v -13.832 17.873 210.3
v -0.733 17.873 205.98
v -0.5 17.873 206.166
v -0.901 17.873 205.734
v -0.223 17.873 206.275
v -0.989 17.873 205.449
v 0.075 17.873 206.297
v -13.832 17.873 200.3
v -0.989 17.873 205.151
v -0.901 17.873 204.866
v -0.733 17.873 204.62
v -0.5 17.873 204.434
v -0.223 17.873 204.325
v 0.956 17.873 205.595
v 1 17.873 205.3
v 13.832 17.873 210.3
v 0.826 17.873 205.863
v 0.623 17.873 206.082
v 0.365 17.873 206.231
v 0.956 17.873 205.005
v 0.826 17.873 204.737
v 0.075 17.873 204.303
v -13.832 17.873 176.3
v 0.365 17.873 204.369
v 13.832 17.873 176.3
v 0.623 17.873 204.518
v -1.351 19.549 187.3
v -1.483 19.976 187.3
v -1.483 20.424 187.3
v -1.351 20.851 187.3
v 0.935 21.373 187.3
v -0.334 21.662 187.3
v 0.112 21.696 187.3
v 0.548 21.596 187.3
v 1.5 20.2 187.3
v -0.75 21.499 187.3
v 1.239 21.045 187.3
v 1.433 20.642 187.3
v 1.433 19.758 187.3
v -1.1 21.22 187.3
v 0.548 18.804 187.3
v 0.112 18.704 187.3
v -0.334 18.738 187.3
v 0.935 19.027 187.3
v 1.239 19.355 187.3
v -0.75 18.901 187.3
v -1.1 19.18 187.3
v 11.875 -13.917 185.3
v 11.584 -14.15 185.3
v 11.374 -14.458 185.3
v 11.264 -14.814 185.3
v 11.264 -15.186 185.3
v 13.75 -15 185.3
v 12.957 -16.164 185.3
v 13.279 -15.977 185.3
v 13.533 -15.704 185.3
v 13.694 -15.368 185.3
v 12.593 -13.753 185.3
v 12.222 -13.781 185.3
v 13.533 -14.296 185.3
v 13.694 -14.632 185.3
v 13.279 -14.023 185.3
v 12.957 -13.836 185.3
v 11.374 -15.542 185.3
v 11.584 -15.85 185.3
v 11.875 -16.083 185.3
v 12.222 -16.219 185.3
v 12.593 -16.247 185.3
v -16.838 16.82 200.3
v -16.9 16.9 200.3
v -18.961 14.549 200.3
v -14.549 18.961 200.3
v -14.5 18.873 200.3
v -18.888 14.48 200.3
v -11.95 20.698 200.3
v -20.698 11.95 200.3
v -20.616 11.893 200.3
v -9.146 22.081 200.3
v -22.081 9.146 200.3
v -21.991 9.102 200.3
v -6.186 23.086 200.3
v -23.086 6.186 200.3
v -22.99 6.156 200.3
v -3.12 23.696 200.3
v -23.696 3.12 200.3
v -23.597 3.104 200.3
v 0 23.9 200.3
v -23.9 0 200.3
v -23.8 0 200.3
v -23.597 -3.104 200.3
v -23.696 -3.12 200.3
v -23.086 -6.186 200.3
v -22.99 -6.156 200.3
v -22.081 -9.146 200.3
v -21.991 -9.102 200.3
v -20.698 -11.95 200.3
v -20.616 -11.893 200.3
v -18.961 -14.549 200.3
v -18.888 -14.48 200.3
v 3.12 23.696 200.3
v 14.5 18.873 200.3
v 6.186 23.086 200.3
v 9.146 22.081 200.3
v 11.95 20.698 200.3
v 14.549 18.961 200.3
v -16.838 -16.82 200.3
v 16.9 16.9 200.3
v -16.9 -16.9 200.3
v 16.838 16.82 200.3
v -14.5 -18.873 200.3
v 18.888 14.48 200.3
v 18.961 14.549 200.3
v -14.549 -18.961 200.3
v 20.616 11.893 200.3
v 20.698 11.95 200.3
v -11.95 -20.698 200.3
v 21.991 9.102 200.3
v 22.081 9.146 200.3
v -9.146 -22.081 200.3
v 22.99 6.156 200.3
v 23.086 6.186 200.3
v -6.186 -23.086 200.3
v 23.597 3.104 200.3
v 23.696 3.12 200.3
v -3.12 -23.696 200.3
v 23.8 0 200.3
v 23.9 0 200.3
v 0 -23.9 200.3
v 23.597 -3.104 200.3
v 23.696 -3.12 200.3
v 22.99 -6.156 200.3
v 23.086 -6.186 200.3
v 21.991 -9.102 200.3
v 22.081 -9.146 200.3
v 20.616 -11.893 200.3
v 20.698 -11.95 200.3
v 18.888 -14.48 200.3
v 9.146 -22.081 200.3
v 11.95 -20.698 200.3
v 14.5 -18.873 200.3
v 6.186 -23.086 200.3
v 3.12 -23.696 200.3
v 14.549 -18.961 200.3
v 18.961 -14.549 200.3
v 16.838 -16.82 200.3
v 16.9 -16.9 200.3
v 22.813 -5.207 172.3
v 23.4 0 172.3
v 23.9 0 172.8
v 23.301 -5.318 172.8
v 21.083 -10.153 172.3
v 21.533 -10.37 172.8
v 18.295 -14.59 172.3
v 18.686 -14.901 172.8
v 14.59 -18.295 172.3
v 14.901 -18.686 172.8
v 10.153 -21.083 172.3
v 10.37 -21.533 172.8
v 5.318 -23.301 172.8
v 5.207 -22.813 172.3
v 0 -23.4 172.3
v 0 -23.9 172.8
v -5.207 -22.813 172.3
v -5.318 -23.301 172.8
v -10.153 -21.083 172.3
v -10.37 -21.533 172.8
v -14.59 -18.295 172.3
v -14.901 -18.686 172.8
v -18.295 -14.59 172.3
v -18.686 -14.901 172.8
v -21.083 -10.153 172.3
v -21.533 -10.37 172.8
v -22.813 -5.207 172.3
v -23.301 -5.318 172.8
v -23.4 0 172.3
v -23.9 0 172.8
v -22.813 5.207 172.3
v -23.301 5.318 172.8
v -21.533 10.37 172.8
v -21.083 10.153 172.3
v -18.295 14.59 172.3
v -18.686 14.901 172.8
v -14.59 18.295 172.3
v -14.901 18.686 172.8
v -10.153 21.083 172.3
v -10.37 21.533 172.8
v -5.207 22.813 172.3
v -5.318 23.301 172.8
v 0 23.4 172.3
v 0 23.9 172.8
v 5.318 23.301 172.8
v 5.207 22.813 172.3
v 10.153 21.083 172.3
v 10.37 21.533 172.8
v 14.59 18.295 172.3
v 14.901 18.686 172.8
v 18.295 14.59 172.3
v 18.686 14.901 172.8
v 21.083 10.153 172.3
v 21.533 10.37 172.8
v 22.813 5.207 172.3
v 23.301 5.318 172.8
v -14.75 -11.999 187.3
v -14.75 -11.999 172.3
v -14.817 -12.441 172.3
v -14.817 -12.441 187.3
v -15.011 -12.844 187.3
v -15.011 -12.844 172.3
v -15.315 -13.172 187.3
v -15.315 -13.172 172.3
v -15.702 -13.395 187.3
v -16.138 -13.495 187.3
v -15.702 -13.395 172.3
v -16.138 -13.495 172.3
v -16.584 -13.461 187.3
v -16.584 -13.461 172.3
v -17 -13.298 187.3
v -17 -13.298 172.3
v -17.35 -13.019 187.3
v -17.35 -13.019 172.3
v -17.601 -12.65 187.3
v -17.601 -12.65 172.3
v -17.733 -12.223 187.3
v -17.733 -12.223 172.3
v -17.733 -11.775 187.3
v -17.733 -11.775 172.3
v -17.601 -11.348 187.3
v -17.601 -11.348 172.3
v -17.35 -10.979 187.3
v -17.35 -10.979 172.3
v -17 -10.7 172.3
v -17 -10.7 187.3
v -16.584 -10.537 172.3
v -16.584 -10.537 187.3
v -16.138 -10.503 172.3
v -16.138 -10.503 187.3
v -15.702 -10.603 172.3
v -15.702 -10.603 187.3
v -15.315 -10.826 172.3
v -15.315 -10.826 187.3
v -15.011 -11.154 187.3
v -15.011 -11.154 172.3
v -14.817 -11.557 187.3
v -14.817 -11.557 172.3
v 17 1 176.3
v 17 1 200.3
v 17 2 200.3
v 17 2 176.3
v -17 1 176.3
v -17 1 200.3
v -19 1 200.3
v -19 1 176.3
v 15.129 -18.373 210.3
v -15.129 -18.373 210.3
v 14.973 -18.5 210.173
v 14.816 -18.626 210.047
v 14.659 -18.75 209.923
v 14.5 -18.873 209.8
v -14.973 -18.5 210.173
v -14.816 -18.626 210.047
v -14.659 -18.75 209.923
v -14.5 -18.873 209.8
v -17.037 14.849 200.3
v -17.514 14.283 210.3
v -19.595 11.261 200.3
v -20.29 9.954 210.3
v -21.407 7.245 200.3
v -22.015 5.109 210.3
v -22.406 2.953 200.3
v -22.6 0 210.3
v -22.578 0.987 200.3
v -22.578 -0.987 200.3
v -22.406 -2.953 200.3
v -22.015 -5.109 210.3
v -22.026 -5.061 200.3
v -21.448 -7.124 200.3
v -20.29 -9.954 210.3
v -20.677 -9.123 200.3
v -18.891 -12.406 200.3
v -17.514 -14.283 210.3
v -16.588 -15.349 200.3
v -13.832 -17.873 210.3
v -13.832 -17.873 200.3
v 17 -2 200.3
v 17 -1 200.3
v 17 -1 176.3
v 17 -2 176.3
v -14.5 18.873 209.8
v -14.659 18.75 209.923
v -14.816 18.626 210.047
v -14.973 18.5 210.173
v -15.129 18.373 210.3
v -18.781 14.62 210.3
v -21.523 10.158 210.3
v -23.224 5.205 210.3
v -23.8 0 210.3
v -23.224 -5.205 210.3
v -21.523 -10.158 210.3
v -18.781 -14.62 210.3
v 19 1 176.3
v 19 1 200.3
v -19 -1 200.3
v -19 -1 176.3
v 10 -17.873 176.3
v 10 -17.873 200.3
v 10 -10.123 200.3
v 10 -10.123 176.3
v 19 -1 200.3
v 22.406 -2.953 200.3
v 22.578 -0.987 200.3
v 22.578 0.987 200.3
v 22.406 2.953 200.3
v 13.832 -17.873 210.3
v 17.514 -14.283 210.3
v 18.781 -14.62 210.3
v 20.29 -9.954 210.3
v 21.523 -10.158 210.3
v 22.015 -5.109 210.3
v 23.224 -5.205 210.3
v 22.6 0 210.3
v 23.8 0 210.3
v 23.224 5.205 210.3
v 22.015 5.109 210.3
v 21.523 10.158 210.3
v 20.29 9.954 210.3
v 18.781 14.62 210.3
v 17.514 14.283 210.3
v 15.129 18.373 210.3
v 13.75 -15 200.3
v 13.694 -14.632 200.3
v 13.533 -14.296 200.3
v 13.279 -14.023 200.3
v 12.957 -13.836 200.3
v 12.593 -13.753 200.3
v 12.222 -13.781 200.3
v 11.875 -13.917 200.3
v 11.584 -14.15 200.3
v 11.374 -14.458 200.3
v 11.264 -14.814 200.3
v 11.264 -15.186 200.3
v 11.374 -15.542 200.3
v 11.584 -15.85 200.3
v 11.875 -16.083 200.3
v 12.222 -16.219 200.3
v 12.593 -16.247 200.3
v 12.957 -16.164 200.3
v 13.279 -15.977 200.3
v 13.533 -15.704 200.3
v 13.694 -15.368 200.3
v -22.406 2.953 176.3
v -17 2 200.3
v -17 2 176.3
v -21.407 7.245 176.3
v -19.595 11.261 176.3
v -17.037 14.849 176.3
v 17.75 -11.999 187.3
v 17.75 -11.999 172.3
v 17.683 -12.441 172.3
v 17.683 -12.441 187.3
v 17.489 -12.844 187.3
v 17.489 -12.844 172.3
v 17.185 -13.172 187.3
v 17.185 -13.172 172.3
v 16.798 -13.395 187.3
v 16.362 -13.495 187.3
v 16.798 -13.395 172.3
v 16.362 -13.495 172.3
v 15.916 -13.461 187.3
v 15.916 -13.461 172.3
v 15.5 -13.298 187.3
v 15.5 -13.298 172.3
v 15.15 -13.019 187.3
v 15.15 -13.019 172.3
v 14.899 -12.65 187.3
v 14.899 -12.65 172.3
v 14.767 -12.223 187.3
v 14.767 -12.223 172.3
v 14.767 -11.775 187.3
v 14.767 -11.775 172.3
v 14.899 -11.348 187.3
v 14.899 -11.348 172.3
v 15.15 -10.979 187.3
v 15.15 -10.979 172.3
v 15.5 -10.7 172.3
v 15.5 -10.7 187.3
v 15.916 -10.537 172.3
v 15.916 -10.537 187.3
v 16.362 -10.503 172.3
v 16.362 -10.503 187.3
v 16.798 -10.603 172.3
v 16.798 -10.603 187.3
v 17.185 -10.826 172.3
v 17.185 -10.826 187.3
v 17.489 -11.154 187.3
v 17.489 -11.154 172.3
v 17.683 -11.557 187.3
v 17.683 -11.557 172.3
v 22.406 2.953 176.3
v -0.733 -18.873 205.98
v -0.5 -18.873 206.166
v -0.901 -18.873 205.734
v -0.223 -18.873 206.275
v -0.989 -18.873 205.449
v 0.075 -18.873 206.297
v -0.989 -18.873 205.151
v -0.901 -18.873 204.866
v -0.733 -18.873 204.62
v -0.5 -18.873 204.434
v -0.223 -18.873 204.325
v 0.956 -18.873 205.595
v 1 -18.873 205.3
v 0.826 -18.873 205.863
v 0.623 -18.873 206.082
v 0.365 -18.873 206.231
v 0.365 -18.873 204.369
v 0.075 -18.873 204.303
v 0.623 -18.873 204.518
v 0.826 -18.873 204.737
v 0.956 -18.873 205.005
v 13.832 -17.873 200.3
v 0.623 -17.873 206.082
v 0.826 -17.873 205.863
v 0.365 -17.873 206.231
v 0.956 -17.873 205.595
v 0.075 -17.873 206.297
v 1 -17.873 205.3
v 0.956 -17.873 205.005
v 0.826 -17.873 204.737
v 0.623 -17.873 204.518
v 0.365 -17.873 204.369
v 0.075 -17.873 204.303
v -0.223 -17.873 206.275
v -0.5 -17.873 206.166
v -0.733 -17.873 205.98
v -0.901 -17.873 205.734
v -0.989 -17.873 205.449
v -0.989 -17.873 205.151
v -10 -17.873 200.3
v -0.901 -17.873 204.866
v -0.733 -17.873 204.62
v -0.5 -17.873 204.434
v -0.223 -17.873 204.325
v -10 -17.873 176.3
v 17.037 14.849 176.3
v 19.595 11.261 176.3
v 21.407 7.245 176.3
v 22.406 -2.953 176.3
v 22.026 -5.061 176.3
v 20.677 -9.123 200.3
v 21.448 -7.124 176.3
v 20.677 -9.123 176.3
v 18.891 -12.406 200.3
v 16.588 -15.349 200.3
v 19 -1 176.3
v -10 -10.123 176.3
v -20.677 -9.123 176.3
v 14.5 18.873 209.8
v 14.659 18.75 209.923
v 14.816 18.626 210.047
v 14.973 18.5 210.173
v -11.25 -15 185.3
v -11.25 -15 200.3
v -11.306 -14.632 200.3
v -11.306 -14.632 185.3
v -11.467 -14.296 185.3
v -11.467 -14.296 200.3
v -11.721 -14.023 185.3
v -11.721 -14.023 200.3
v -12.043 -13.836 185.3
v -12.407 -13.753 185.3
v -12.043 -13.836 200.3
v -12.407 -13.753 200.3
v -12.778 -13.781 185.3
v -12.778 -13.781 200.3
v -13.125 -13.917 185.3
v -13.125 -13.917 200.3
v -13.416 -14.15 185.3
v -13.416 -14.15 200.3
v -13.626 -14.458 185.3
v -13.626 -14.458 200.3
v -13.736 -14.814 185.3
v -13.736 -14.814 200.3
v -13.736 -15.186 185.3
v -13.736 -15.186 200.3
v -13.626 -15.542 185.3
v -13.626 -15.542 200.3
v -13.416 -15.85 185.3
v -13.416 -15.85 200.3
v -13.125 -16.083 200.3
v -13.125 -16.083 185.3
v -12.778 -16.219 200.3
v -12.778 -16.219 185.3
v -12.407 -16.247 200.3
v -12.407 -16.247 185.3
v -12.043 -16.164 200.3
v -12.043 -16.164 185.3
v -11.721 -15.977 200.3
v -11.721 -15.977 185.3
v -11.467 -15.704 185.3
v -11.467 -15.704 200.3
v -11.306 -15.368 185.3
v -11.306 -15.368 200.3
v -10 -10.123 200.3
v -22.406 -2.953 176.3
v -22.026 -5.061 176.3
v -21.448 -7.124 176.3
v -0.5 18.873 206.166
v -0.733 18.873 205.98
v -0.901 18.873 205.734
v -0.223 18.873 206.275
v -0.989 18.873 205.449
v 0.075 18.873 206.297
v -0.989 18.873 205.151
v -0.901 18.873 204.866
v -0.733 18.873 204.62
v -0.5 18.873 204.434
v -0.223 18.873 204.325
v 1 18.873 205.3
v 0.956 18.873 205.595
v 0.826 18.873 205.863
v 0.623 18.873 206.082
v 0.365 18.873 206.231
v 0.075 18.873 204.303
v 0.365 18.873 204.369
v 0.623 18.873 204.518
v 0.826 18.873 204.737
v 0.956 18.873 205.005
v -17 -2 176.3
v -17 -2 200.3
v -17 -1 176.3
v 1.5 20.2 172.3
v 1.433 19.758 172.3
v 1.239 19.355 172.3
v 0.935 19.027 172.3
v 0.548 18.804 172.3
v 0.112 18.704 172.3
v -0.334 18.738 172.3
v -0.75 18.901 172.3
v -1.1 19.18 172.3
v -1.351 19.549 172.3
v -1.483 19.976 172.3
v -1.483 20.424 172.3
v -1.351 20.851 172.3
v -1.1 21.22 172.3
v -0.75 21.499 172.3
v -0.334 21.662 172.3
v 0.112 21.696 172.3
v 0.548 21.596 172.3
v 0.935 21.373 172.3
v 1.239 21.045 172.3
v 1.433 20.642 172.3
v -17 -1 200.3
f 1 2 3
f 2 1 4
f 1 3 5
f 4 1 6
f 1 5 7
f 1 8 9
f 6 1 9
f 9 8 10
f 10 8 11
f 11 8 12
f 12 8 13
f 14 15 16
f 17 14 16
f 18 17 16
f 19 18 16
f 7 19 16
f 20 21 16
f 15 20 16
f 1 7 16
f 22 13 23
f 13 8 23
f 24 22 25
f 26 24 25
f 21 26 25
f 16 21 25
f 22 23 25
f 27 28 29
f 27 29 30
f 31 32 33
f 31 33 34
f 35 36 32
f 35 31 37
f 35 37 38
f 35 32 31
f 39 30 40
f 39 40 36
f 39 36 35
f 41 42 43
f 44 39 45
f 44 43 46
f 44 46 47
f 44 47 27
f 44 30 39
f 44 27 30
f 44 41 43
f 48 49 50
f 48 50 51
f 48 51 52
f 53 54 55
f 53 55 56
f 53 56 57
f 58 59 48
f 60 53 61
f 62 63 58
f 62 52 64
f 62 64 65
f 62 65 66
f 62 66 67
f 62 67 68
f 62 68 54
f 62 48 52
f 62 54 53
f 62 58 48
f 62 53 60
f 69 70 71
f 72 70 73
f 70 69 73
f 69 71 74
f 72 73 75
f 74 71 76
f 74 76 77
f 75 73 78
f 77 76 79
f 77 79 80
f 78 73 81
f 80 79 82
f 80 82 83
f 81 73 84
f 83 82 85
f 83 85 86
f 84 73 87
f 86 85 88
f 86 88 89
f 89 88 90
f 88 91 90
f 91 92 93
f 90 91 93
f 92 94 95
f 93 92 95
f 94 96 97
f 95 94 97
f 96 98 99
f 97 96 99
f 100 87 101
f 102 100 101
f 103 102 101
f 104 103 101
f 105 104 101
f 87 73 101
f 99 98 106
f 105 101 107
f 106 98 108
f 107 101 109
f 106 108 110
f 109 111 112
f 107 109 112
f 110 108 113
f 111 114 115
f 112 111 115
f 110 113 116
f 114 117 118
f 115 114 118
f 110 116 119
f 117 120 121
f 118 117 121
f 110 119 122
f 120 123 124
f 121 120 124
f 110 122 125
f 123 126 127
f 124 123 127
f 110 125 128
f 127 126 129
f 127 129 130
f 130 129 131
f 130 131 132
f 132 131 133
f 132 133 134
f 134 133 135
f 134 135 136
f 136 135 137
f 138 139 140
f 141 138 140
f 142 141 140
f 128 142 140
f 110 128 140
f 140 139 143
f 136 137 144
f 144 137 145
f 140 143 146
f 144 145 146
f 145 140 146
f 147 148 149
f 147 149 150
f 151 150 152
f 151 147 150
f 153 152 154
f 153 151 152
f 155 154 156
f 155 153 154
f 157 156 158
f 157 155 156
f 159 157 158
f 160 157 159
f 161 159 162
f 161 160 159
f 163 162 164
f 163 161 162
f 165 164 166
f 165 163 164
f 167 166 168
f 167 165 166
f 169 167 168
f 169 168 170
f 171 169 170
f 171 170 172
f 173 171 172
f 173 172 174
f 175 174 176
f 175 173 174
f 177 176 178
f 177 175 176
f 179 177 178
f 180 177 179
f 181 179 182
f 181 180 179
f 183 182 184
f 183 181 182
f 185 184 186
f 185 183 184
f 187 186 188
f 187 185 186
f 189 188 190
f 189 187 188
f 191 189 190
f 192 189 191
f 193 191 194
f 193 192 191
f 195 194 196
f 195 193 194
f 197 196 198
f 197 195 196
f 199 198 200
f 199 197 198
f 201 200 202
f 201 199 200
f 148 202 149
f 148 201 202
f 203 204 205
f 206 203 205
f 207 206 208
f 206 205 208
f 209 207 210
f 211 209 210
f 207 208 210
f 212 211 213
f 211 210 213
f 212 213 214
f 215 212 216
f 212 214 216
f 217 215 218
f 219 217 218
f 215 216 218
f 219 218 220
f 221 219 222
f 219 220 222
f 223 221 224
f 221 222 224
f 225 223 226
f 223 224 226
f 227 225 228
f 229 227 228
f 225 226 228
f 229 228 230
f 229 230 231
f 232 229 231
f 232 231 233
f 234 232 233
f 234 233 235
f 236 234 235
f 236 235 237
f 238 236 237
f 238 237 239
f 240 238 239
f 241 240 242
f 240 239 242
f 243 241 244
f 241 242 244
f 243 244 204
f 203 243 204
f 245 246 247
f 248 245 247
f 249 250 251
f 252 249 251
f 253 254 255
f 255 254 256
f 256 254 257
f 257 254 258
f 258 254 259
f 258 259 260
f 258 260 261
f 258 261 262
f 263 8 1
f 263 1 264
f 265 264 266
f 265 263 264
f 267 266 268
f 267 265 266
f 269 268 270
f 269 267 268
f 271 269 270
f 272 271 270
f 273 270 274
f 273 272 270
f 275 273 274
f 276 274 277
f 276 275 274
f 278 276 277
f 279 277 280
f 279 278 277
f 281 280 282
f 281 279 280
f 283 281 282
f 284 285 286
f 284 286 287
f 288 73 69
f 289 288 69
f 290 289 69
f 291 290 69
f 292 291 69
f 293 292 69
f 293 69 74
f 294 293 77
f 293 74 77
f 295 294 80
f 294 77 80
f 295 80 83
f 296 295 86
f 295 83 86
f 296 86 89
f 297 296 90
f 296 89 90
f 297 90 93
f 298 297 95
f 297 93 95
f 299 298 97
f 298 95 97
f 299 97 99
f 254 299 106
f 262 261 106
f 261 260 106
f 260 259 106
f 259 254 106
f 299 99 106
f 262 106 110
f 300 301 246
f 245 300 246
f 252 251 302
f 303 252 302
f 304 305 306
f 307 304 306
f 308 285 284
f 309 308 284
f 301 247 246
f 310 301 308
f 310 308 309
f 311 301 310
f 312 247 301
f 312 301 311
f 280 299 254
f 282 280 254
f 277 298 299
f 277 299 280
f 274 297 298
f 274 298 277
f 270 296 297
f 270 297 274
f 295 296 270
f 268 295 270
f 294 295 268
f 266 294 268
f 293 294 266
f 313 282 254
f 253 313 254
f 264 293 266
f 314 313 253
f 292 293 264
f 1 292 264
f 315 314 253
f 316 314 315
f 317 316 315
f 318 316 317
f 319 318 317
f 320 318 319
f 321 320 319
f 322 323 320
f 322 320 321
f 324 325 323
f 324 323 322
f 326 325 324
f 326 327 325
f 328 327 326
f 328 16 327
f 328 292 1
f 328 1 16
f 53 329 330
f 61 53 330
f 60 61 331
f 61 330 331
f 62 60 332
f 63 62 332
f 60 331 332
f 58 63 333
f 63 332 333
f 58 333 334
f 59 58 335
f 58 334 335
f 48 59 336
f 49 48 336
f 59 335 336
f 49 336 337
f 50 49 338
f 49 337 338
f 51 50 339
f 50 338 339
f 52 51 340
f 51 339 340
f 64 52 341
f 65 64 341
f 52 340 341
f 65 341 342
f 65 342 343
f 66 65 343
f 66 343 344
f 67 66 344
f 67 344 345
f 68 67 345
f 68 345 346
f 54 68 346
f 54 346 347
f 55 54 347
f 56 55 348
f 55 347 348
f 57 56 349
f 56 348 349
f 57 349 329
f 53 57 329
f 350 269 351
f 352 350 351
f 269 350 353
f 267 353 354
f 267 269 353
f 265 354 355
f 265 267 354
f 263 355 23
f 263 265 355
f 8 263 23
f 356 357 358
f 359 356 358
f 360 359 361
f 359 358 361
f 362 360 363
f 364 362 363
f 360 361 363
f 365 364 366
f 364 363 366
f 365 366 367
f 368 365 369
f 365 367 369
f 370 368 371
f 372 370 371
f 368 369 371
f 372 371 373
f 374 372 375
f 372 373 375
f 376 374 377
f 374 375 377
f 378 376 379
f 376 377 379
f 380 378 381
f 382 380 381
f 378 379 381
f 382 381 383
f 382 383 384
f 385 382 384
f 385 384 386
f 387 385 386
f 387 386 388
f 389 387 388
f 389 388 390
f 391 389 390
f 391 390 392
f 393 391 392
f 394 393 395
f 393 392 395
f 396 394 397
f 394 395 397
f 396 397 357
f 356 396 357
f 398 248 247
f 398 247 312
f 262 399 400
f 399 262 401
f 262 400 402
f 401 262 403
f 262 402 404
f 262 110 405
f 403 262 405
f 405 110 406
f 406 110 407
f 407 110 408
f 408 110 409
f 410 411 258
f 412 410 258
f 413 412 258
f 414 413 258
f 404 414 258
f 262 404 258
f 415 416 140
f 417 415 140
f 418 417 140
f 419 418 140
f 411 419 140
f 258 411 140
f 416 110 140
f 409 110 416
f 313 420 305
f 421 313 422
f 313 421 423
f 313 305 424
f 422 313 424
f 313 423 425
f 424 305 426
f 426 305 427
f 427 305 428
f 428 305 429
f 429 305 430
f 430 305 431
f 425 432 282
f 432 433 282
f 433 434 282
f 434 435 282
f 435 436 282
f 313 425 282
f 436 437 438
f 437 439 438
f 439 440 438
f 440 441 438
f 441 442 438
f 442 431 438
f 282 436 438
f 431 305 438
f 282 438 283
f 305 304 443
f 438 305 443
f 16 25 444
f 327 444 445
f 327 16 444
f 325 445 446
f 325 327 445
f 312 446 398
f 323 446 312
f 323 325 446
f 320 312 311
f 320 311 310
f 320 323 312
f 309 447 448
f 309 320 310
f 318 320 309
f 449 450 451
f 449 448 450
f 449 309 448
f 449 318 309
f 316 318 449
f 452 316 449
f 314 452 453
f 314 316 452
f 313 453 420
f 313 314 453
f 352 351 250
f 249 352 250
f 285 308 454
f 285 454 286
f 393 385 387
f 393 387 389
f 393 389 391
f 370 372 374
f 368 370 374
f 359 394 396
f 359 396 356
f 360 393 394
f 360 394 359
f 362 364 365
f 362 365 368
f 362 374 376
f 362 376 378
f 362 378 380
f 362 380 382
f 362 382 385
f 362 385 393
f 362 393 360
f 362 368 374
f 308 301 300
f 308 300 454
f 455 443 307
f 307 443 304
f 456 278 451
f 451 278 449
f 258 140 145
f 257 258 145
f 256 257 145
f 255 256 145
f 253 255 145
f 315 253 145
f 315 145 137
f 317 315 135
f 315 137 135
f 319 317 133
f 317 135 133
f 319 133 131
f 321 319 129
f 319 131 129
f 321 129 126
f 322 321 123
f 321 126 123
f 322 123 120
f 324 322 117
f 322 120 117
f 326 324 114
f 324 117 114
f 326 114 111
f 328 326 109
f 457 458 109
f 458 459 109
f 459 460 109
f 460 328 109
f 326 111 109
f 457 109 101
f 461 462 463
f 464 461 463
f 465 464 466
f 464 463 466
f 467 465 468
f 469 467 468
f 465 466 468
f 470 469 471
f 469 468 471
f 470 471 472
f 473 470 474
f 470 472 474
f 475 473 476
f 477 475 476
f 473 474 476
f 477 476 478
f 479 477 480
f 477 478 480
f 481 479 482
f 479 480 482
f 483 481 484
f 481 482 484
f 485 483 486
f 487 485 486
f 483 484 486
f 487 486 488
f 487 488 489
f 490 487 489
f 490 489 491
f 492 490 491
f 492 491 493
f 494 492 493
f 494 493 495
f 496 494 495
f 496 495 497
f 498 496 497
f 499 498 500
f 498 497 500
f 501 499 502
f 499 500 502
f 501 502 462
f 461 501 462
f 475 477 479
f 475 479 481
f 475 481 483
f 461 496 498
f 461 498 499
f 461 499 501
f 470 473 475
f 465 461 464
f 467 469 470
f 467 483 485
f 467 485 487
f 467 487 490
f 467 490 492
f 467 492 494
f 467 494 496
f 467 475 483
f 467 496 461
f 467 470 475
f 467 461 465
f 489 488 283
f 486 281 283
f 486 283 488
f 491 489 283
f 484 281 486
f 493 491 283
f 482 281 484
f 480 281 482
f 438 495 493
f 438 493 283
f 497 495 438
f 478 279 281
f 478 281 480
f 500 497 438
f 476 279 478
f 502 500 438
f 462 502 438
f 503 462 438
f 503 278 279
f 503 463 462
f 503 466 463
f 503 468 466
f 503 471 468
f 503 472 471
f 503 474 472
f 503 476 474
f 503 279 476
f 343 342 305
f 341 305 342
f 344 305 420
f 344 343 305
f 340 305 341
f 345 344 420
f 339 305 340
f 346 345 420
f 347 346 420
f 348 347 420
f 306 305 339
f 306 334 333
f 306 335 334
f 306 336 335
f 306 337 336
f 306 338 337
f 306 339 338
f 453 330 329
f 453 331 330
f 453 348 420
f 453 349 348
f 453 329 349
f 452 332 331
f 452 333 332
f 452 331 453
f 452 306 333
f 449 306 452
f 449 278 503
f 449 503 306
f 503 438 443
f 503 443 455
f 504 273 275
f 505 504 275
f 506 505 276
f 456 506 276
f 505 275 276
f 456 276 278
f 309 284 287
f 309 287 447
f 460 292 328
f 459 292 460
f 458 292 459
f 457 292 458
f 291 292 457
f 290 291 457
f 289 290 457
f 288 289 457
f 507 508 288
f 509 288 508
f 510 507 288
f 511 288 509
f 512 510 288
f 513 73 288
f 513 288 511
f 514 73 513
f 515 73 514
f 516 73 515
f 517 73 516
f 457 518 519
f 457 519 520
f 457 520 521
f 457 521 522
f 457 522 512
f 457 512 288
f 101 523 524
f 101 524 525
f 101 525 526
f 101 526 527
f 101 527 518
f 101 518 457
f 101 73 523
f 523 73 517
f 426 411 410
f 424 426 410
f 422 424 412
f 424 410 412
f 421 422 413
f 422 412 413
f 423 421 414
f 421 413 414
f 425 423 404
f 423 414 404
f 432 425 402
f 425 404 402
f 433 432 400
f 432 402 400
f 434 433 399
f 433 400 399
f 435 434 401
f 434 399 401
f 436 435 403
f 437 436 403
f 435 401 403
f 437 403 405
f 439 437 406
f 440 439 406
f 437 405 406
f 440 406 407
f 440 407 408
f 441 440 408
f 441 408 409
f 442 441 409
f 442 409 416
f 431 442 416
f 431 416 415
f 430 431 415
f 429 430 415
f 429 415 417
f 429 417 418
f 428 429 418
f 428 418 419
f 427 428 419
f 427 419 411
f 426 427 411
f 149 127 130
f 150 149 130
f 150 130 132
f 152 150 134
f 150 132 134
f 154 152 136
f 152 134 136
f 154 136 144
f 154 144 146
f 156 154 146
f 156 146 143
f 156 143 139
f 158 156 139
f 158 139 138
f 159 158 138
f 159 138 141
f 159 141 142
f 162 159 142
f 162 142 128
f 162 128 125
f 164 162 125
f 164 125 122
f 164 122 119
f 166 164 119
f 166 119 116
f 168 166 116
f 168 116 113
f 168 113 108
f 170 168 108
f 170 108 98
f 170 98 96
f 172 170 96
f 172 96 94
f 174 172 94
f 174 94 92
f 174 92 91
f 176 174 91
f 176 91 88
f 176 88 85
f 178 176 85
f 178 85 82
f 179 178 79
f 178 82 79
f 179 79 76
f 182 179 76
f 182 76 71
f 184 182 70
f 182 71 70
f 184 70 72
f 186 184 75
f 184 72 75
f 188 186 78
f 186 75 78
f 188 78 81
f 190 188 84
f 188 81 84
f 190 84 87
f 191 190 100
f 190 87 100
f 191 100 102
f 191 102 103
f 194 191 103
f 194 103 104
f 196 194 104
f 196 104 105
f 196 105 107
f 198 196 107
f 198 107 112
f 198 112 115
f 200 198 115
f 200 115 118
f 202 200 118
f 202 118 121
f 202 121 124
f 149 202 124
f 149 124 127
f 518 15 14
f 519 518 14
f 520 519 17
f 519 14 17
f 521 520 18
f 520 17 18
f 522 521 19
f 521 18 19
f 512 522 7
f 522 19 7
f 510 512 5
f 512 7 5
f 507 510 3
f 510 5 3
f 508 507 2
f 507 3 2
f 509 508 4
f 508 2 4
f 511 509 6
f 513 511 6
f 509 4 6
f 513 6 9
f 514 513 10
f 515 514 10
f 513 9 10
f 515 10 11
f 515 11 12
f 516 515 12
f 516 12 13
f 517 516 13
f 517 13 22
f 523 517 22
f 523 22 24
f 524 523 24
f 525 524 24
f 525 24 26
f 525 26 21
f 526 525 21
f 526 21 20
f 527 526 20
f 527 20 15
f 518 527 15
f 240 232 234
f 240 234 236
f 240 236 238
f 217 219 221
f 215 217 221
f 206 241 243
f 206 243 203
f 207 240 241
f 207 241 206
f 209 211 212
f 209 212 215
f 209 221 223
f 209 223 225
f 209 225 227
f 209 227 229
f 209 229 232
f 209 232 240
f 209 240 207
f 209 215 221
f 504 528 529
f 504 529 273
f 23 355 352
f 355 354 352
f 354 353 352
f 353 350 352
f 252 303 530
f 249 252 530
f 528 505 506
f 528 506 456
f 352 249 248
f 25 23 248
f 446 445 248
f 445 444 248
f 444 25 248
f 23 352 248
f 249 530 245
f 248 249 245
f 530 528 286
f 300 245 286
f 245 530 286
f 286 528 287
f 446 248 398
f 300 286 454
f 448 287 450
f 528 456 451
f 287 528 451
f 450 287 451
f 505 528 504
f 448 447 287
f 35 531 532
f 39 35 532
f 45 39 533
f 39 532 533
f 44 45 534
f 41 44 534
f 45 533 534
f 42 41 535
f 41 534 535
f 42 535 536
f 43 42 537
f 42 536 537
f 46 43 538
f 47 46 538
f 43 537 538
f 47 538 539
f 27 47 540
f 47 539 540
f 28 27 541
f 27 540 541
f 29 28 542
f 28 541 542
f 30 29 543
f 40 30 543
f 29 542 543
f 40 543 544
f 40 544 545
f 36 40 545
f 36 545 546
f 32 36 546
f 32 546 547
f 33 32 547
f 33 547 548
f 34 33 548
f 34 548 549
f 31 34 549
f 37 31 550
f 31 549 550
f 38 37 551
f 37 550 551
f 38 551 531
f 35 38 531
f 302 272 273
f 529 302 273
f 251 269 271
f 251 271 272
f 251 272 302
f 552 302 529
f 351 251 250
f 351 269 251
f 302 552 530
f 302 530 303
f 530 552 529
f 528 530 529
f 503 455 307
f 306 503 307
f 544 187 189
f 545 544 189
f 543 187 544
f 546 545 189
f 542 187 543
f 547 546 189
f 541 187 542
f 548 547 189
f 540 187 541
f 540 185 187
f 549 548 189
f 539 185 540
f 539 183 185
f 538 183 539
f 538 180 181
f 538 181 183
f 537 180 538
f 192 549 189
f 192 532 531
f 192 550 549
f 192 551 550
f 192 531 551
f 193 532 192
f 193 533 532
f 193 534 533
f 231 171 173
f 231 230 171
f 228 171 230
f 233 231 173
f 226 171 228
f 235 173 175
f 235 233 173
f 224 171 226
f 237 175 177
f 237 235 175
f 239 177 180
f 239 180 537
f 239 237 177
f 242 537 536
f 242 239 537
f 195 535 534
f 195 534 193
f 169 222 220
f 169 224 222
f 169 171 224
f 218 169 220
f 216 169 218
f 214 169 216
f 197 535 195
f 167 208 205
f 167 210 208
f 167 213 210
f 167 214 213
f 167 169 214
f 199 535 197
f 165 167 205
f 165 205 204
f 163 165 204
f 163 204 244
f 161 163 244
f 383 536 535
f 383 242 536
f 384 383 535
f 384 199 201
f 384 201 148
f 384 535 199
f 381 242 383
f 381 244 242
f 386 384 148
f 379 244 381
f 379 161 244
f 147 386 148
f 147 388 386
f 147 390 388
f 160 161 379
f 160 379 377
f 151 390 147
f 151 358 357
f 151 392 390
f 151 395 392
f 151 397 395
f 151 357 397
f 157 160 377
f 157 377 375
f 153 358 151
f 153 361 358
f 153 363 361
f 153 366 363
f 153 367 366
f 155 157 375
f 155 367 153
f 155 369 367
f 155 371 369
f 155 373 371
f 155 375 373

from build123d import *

# Parameters (mm, degrees)
PAD022_DEPTH    = 10
CHAMFER009_SIZE = 0.5
SKETCH040_R     = 23.9
SKETCH040_R_2   = 22.6
PAD023_DEPTH    = 24
SKETCH041_R     = 23.5
SKETCH041_W     = 20
SKETCH041_H     = 7.75
PAD024_DEPTH    = 24
SKETCH042_R     = 23.9
PAD025_DEPTH    = 4
CHAMFER010_SIZE = 0.5
SKETCH043_R     = 1.5
POCKET013_DEPTH = 15
SKETCH044_R     = 1
POCKET014_DEPTH = 100
SKETCH045_R     = 1.25
POCKET015_DEPTH = 15


with BuildPart() as part:
    # Sketch039 → Pad022 (new body)
    with BuildSketch(Plane.XY):
        with BuildLine():
            ThreePointArc((-14.5, 18.8729965824), (-23.8, 0), (-14.5, -18.8729965824))
            Line((-14.5, -18.8729965824), (14.5, -18.8729965824))
            ThreePointArc((14.5, -18.8729965824), (23.8, 0), (14.5, 18.8729965824))
            Line((-14.5, 18.8729965824), (14.5, 18.8729965824))
        make_face()
        with BuildLine():
            ThreePointArc((-13.8317024681, 17.8729965824), (-22.6, 0), (-13.8317024681, -17.8729965824))
            Line((13.8317024681, -17.8729965824), (-13.8317024681, -17.8729965824))
            ThreePointArc((13.8317024681, -17.8729965824), (22.6, 0), (13.8317024681, 17.8729965824))
            Line((-13.8317024681, 17.8729965824), (13.8317024681, 17.8729965824))
        make_face(mode=Mode.SUBTRACT)
    extrude(amount=PAD022_DEPTH)

    # Chamfer009
    chamfer009_edges = [part.edges().sort_by_distance(p)[0] for p in [
        (0, -18.872997, 10),
        (0, 18.872997, 10),
    ]]
    chamfer(chamfer009_edges, length=CHAMFER009_SIZE)

    # Sketch040 (on Face4 of Chamfer009) → Pad023 (join)
    with BuildSketch(Plane(origin=(0, 0, 0), x_dir=(1, 0, 0), z_dir=(0, 0, -1))):
        Circle(SKETCH040_R)
        Circle(SKETCH040_R_2, mode=Mode.SUBTRACT)
    extrude(amount=PAD023_DEPTH)

    # Sketch041 (on Face4 of Pad023) → Pad024 (join)
    with BuildSketch(Plane.XY):
        Circle(SKETCH041_R)
        with BuildLine():
            Line((-22.4062101037, 2.9532607047), (-17, 2))
            Line((-17, 2), (-17, 1))
            Line((-17, 1), (-19, 1))
            Line((-19, 1), (-19, -1))
            Line((-17, -1), (-19, -1))
            Line((-17, -1), (-17, -2))
            Line((-17, -2), (-22.4062101037, -2.9532607047))
            ThreePointArc((-22.4062101037, -2.9532607047), (-21.7612799705, -6.099729014), (-20.6768211618, -9.1229965824))
            Line((-20.6768211618, -9.1229965824), (20.6768211618, -9.1229965824))
            ThreePointArc((20.6768211618, -9.1229965824), (21.7612799705, -6.099729014), (22.4062101037, -2.9532607047))
            Line((17, -2), (22.4062101037, -2.9532607047))
            Line((17, -1), (17, -2))
            Line((19, -1), (17, -1))
            Line((19, 1), (19, -1))
            Line((19, 1), (17, 1))
            Line((17, 1), (17, 2))
            Line((17, 2), (22.4062101037, 2.9532607047))
            ThreePointArc((22.4062101037, 2.9532607047), (19.5945453266, 11.2611630592), (13.8317024681, 17.8729965824))
            Line((13.8317024681, 17.8729965824), (-13.8317024681, 17.8729965824))
            ThreePointArc((-13.8317024681, 17.8729965824), (-19.5945453266, 11.2611630592), (-22.4062101037, 2.9532607047))
        make_face(mode=Mode.SUBTRACT)
        with Locations((0, -13.9979965824)):
            Rectangle(SKETCH041_W, SKETCH041_H, mode=Mode.SUBTRACT)
    extrude(amount=-PAD024_DEPTH)

    # Sketch042 (on Face49 of Pad024) → Pad025 (join)
    with BuildSketch(Plane(origin=(0, 0, -24), x_dir=(1, 0, 0), z_dir=(0, 0, -1))):
        Circle(SKETCH042_R)
    extrude(amount=PAD025_DEPTH)

    # Chamfer010
    chamfer010_edges = [part.edges().sort_by_distance(p)[0] for p in [
        (-23.9, 0, -28),
    ]]
    chamfer(chamfer010_edges, length=CHAMFER010_SIZE)

    # Sketch043 (on Face4 of Chamfer010) → Pocket013 (cut)
    with BuildSketch(Plane(origin=(0, 0, -28), x_dir=(1, 0, 0), z_dir=(0, 0, -1))):
        with Locations((-16.25, 11.9990624634)):
            Circle(SKETCH043_R)
        with Locations((16.25, 11.9990624634)):
            Circle(SKETCH043_R)
        with Locations((0, -20.2)):
            Circle(SKETCH043_R)
    extrude(amount=-POCKET013_DEPTH, mode=Mode.SUBTRACT)

    # Sketch044 (on Face9 of Pocket013) → Pocket014 (cut)
    with BuildSketch(Plane.XZ.offset(18.8729965824)):
        with Locations((0, 5)):
            Circle(SKETCH044_R)
    extrude(amount=-POCKET014_DEPTH, mode=Mode.SUBTRACT)

    # Sketch045 (on Face29 of Pocket014) → Pocket015 (cut)
    with BuildSketch(Plane.XY):
        with Locations((12.5, -15)):
            Circle(SKETCH045_R)
        with Locations((-12.5, -15)):
            Circle(SKETCH045_R)
    extrude(amount=-POCKET015_DEPTH, mode=Mode.SUBTRACT)


with BuildPart() as part_1:
    # Body017 placement: moved
    add(part.part.moved(Location((0, 0, 200.3))))


solid = part_1.part
